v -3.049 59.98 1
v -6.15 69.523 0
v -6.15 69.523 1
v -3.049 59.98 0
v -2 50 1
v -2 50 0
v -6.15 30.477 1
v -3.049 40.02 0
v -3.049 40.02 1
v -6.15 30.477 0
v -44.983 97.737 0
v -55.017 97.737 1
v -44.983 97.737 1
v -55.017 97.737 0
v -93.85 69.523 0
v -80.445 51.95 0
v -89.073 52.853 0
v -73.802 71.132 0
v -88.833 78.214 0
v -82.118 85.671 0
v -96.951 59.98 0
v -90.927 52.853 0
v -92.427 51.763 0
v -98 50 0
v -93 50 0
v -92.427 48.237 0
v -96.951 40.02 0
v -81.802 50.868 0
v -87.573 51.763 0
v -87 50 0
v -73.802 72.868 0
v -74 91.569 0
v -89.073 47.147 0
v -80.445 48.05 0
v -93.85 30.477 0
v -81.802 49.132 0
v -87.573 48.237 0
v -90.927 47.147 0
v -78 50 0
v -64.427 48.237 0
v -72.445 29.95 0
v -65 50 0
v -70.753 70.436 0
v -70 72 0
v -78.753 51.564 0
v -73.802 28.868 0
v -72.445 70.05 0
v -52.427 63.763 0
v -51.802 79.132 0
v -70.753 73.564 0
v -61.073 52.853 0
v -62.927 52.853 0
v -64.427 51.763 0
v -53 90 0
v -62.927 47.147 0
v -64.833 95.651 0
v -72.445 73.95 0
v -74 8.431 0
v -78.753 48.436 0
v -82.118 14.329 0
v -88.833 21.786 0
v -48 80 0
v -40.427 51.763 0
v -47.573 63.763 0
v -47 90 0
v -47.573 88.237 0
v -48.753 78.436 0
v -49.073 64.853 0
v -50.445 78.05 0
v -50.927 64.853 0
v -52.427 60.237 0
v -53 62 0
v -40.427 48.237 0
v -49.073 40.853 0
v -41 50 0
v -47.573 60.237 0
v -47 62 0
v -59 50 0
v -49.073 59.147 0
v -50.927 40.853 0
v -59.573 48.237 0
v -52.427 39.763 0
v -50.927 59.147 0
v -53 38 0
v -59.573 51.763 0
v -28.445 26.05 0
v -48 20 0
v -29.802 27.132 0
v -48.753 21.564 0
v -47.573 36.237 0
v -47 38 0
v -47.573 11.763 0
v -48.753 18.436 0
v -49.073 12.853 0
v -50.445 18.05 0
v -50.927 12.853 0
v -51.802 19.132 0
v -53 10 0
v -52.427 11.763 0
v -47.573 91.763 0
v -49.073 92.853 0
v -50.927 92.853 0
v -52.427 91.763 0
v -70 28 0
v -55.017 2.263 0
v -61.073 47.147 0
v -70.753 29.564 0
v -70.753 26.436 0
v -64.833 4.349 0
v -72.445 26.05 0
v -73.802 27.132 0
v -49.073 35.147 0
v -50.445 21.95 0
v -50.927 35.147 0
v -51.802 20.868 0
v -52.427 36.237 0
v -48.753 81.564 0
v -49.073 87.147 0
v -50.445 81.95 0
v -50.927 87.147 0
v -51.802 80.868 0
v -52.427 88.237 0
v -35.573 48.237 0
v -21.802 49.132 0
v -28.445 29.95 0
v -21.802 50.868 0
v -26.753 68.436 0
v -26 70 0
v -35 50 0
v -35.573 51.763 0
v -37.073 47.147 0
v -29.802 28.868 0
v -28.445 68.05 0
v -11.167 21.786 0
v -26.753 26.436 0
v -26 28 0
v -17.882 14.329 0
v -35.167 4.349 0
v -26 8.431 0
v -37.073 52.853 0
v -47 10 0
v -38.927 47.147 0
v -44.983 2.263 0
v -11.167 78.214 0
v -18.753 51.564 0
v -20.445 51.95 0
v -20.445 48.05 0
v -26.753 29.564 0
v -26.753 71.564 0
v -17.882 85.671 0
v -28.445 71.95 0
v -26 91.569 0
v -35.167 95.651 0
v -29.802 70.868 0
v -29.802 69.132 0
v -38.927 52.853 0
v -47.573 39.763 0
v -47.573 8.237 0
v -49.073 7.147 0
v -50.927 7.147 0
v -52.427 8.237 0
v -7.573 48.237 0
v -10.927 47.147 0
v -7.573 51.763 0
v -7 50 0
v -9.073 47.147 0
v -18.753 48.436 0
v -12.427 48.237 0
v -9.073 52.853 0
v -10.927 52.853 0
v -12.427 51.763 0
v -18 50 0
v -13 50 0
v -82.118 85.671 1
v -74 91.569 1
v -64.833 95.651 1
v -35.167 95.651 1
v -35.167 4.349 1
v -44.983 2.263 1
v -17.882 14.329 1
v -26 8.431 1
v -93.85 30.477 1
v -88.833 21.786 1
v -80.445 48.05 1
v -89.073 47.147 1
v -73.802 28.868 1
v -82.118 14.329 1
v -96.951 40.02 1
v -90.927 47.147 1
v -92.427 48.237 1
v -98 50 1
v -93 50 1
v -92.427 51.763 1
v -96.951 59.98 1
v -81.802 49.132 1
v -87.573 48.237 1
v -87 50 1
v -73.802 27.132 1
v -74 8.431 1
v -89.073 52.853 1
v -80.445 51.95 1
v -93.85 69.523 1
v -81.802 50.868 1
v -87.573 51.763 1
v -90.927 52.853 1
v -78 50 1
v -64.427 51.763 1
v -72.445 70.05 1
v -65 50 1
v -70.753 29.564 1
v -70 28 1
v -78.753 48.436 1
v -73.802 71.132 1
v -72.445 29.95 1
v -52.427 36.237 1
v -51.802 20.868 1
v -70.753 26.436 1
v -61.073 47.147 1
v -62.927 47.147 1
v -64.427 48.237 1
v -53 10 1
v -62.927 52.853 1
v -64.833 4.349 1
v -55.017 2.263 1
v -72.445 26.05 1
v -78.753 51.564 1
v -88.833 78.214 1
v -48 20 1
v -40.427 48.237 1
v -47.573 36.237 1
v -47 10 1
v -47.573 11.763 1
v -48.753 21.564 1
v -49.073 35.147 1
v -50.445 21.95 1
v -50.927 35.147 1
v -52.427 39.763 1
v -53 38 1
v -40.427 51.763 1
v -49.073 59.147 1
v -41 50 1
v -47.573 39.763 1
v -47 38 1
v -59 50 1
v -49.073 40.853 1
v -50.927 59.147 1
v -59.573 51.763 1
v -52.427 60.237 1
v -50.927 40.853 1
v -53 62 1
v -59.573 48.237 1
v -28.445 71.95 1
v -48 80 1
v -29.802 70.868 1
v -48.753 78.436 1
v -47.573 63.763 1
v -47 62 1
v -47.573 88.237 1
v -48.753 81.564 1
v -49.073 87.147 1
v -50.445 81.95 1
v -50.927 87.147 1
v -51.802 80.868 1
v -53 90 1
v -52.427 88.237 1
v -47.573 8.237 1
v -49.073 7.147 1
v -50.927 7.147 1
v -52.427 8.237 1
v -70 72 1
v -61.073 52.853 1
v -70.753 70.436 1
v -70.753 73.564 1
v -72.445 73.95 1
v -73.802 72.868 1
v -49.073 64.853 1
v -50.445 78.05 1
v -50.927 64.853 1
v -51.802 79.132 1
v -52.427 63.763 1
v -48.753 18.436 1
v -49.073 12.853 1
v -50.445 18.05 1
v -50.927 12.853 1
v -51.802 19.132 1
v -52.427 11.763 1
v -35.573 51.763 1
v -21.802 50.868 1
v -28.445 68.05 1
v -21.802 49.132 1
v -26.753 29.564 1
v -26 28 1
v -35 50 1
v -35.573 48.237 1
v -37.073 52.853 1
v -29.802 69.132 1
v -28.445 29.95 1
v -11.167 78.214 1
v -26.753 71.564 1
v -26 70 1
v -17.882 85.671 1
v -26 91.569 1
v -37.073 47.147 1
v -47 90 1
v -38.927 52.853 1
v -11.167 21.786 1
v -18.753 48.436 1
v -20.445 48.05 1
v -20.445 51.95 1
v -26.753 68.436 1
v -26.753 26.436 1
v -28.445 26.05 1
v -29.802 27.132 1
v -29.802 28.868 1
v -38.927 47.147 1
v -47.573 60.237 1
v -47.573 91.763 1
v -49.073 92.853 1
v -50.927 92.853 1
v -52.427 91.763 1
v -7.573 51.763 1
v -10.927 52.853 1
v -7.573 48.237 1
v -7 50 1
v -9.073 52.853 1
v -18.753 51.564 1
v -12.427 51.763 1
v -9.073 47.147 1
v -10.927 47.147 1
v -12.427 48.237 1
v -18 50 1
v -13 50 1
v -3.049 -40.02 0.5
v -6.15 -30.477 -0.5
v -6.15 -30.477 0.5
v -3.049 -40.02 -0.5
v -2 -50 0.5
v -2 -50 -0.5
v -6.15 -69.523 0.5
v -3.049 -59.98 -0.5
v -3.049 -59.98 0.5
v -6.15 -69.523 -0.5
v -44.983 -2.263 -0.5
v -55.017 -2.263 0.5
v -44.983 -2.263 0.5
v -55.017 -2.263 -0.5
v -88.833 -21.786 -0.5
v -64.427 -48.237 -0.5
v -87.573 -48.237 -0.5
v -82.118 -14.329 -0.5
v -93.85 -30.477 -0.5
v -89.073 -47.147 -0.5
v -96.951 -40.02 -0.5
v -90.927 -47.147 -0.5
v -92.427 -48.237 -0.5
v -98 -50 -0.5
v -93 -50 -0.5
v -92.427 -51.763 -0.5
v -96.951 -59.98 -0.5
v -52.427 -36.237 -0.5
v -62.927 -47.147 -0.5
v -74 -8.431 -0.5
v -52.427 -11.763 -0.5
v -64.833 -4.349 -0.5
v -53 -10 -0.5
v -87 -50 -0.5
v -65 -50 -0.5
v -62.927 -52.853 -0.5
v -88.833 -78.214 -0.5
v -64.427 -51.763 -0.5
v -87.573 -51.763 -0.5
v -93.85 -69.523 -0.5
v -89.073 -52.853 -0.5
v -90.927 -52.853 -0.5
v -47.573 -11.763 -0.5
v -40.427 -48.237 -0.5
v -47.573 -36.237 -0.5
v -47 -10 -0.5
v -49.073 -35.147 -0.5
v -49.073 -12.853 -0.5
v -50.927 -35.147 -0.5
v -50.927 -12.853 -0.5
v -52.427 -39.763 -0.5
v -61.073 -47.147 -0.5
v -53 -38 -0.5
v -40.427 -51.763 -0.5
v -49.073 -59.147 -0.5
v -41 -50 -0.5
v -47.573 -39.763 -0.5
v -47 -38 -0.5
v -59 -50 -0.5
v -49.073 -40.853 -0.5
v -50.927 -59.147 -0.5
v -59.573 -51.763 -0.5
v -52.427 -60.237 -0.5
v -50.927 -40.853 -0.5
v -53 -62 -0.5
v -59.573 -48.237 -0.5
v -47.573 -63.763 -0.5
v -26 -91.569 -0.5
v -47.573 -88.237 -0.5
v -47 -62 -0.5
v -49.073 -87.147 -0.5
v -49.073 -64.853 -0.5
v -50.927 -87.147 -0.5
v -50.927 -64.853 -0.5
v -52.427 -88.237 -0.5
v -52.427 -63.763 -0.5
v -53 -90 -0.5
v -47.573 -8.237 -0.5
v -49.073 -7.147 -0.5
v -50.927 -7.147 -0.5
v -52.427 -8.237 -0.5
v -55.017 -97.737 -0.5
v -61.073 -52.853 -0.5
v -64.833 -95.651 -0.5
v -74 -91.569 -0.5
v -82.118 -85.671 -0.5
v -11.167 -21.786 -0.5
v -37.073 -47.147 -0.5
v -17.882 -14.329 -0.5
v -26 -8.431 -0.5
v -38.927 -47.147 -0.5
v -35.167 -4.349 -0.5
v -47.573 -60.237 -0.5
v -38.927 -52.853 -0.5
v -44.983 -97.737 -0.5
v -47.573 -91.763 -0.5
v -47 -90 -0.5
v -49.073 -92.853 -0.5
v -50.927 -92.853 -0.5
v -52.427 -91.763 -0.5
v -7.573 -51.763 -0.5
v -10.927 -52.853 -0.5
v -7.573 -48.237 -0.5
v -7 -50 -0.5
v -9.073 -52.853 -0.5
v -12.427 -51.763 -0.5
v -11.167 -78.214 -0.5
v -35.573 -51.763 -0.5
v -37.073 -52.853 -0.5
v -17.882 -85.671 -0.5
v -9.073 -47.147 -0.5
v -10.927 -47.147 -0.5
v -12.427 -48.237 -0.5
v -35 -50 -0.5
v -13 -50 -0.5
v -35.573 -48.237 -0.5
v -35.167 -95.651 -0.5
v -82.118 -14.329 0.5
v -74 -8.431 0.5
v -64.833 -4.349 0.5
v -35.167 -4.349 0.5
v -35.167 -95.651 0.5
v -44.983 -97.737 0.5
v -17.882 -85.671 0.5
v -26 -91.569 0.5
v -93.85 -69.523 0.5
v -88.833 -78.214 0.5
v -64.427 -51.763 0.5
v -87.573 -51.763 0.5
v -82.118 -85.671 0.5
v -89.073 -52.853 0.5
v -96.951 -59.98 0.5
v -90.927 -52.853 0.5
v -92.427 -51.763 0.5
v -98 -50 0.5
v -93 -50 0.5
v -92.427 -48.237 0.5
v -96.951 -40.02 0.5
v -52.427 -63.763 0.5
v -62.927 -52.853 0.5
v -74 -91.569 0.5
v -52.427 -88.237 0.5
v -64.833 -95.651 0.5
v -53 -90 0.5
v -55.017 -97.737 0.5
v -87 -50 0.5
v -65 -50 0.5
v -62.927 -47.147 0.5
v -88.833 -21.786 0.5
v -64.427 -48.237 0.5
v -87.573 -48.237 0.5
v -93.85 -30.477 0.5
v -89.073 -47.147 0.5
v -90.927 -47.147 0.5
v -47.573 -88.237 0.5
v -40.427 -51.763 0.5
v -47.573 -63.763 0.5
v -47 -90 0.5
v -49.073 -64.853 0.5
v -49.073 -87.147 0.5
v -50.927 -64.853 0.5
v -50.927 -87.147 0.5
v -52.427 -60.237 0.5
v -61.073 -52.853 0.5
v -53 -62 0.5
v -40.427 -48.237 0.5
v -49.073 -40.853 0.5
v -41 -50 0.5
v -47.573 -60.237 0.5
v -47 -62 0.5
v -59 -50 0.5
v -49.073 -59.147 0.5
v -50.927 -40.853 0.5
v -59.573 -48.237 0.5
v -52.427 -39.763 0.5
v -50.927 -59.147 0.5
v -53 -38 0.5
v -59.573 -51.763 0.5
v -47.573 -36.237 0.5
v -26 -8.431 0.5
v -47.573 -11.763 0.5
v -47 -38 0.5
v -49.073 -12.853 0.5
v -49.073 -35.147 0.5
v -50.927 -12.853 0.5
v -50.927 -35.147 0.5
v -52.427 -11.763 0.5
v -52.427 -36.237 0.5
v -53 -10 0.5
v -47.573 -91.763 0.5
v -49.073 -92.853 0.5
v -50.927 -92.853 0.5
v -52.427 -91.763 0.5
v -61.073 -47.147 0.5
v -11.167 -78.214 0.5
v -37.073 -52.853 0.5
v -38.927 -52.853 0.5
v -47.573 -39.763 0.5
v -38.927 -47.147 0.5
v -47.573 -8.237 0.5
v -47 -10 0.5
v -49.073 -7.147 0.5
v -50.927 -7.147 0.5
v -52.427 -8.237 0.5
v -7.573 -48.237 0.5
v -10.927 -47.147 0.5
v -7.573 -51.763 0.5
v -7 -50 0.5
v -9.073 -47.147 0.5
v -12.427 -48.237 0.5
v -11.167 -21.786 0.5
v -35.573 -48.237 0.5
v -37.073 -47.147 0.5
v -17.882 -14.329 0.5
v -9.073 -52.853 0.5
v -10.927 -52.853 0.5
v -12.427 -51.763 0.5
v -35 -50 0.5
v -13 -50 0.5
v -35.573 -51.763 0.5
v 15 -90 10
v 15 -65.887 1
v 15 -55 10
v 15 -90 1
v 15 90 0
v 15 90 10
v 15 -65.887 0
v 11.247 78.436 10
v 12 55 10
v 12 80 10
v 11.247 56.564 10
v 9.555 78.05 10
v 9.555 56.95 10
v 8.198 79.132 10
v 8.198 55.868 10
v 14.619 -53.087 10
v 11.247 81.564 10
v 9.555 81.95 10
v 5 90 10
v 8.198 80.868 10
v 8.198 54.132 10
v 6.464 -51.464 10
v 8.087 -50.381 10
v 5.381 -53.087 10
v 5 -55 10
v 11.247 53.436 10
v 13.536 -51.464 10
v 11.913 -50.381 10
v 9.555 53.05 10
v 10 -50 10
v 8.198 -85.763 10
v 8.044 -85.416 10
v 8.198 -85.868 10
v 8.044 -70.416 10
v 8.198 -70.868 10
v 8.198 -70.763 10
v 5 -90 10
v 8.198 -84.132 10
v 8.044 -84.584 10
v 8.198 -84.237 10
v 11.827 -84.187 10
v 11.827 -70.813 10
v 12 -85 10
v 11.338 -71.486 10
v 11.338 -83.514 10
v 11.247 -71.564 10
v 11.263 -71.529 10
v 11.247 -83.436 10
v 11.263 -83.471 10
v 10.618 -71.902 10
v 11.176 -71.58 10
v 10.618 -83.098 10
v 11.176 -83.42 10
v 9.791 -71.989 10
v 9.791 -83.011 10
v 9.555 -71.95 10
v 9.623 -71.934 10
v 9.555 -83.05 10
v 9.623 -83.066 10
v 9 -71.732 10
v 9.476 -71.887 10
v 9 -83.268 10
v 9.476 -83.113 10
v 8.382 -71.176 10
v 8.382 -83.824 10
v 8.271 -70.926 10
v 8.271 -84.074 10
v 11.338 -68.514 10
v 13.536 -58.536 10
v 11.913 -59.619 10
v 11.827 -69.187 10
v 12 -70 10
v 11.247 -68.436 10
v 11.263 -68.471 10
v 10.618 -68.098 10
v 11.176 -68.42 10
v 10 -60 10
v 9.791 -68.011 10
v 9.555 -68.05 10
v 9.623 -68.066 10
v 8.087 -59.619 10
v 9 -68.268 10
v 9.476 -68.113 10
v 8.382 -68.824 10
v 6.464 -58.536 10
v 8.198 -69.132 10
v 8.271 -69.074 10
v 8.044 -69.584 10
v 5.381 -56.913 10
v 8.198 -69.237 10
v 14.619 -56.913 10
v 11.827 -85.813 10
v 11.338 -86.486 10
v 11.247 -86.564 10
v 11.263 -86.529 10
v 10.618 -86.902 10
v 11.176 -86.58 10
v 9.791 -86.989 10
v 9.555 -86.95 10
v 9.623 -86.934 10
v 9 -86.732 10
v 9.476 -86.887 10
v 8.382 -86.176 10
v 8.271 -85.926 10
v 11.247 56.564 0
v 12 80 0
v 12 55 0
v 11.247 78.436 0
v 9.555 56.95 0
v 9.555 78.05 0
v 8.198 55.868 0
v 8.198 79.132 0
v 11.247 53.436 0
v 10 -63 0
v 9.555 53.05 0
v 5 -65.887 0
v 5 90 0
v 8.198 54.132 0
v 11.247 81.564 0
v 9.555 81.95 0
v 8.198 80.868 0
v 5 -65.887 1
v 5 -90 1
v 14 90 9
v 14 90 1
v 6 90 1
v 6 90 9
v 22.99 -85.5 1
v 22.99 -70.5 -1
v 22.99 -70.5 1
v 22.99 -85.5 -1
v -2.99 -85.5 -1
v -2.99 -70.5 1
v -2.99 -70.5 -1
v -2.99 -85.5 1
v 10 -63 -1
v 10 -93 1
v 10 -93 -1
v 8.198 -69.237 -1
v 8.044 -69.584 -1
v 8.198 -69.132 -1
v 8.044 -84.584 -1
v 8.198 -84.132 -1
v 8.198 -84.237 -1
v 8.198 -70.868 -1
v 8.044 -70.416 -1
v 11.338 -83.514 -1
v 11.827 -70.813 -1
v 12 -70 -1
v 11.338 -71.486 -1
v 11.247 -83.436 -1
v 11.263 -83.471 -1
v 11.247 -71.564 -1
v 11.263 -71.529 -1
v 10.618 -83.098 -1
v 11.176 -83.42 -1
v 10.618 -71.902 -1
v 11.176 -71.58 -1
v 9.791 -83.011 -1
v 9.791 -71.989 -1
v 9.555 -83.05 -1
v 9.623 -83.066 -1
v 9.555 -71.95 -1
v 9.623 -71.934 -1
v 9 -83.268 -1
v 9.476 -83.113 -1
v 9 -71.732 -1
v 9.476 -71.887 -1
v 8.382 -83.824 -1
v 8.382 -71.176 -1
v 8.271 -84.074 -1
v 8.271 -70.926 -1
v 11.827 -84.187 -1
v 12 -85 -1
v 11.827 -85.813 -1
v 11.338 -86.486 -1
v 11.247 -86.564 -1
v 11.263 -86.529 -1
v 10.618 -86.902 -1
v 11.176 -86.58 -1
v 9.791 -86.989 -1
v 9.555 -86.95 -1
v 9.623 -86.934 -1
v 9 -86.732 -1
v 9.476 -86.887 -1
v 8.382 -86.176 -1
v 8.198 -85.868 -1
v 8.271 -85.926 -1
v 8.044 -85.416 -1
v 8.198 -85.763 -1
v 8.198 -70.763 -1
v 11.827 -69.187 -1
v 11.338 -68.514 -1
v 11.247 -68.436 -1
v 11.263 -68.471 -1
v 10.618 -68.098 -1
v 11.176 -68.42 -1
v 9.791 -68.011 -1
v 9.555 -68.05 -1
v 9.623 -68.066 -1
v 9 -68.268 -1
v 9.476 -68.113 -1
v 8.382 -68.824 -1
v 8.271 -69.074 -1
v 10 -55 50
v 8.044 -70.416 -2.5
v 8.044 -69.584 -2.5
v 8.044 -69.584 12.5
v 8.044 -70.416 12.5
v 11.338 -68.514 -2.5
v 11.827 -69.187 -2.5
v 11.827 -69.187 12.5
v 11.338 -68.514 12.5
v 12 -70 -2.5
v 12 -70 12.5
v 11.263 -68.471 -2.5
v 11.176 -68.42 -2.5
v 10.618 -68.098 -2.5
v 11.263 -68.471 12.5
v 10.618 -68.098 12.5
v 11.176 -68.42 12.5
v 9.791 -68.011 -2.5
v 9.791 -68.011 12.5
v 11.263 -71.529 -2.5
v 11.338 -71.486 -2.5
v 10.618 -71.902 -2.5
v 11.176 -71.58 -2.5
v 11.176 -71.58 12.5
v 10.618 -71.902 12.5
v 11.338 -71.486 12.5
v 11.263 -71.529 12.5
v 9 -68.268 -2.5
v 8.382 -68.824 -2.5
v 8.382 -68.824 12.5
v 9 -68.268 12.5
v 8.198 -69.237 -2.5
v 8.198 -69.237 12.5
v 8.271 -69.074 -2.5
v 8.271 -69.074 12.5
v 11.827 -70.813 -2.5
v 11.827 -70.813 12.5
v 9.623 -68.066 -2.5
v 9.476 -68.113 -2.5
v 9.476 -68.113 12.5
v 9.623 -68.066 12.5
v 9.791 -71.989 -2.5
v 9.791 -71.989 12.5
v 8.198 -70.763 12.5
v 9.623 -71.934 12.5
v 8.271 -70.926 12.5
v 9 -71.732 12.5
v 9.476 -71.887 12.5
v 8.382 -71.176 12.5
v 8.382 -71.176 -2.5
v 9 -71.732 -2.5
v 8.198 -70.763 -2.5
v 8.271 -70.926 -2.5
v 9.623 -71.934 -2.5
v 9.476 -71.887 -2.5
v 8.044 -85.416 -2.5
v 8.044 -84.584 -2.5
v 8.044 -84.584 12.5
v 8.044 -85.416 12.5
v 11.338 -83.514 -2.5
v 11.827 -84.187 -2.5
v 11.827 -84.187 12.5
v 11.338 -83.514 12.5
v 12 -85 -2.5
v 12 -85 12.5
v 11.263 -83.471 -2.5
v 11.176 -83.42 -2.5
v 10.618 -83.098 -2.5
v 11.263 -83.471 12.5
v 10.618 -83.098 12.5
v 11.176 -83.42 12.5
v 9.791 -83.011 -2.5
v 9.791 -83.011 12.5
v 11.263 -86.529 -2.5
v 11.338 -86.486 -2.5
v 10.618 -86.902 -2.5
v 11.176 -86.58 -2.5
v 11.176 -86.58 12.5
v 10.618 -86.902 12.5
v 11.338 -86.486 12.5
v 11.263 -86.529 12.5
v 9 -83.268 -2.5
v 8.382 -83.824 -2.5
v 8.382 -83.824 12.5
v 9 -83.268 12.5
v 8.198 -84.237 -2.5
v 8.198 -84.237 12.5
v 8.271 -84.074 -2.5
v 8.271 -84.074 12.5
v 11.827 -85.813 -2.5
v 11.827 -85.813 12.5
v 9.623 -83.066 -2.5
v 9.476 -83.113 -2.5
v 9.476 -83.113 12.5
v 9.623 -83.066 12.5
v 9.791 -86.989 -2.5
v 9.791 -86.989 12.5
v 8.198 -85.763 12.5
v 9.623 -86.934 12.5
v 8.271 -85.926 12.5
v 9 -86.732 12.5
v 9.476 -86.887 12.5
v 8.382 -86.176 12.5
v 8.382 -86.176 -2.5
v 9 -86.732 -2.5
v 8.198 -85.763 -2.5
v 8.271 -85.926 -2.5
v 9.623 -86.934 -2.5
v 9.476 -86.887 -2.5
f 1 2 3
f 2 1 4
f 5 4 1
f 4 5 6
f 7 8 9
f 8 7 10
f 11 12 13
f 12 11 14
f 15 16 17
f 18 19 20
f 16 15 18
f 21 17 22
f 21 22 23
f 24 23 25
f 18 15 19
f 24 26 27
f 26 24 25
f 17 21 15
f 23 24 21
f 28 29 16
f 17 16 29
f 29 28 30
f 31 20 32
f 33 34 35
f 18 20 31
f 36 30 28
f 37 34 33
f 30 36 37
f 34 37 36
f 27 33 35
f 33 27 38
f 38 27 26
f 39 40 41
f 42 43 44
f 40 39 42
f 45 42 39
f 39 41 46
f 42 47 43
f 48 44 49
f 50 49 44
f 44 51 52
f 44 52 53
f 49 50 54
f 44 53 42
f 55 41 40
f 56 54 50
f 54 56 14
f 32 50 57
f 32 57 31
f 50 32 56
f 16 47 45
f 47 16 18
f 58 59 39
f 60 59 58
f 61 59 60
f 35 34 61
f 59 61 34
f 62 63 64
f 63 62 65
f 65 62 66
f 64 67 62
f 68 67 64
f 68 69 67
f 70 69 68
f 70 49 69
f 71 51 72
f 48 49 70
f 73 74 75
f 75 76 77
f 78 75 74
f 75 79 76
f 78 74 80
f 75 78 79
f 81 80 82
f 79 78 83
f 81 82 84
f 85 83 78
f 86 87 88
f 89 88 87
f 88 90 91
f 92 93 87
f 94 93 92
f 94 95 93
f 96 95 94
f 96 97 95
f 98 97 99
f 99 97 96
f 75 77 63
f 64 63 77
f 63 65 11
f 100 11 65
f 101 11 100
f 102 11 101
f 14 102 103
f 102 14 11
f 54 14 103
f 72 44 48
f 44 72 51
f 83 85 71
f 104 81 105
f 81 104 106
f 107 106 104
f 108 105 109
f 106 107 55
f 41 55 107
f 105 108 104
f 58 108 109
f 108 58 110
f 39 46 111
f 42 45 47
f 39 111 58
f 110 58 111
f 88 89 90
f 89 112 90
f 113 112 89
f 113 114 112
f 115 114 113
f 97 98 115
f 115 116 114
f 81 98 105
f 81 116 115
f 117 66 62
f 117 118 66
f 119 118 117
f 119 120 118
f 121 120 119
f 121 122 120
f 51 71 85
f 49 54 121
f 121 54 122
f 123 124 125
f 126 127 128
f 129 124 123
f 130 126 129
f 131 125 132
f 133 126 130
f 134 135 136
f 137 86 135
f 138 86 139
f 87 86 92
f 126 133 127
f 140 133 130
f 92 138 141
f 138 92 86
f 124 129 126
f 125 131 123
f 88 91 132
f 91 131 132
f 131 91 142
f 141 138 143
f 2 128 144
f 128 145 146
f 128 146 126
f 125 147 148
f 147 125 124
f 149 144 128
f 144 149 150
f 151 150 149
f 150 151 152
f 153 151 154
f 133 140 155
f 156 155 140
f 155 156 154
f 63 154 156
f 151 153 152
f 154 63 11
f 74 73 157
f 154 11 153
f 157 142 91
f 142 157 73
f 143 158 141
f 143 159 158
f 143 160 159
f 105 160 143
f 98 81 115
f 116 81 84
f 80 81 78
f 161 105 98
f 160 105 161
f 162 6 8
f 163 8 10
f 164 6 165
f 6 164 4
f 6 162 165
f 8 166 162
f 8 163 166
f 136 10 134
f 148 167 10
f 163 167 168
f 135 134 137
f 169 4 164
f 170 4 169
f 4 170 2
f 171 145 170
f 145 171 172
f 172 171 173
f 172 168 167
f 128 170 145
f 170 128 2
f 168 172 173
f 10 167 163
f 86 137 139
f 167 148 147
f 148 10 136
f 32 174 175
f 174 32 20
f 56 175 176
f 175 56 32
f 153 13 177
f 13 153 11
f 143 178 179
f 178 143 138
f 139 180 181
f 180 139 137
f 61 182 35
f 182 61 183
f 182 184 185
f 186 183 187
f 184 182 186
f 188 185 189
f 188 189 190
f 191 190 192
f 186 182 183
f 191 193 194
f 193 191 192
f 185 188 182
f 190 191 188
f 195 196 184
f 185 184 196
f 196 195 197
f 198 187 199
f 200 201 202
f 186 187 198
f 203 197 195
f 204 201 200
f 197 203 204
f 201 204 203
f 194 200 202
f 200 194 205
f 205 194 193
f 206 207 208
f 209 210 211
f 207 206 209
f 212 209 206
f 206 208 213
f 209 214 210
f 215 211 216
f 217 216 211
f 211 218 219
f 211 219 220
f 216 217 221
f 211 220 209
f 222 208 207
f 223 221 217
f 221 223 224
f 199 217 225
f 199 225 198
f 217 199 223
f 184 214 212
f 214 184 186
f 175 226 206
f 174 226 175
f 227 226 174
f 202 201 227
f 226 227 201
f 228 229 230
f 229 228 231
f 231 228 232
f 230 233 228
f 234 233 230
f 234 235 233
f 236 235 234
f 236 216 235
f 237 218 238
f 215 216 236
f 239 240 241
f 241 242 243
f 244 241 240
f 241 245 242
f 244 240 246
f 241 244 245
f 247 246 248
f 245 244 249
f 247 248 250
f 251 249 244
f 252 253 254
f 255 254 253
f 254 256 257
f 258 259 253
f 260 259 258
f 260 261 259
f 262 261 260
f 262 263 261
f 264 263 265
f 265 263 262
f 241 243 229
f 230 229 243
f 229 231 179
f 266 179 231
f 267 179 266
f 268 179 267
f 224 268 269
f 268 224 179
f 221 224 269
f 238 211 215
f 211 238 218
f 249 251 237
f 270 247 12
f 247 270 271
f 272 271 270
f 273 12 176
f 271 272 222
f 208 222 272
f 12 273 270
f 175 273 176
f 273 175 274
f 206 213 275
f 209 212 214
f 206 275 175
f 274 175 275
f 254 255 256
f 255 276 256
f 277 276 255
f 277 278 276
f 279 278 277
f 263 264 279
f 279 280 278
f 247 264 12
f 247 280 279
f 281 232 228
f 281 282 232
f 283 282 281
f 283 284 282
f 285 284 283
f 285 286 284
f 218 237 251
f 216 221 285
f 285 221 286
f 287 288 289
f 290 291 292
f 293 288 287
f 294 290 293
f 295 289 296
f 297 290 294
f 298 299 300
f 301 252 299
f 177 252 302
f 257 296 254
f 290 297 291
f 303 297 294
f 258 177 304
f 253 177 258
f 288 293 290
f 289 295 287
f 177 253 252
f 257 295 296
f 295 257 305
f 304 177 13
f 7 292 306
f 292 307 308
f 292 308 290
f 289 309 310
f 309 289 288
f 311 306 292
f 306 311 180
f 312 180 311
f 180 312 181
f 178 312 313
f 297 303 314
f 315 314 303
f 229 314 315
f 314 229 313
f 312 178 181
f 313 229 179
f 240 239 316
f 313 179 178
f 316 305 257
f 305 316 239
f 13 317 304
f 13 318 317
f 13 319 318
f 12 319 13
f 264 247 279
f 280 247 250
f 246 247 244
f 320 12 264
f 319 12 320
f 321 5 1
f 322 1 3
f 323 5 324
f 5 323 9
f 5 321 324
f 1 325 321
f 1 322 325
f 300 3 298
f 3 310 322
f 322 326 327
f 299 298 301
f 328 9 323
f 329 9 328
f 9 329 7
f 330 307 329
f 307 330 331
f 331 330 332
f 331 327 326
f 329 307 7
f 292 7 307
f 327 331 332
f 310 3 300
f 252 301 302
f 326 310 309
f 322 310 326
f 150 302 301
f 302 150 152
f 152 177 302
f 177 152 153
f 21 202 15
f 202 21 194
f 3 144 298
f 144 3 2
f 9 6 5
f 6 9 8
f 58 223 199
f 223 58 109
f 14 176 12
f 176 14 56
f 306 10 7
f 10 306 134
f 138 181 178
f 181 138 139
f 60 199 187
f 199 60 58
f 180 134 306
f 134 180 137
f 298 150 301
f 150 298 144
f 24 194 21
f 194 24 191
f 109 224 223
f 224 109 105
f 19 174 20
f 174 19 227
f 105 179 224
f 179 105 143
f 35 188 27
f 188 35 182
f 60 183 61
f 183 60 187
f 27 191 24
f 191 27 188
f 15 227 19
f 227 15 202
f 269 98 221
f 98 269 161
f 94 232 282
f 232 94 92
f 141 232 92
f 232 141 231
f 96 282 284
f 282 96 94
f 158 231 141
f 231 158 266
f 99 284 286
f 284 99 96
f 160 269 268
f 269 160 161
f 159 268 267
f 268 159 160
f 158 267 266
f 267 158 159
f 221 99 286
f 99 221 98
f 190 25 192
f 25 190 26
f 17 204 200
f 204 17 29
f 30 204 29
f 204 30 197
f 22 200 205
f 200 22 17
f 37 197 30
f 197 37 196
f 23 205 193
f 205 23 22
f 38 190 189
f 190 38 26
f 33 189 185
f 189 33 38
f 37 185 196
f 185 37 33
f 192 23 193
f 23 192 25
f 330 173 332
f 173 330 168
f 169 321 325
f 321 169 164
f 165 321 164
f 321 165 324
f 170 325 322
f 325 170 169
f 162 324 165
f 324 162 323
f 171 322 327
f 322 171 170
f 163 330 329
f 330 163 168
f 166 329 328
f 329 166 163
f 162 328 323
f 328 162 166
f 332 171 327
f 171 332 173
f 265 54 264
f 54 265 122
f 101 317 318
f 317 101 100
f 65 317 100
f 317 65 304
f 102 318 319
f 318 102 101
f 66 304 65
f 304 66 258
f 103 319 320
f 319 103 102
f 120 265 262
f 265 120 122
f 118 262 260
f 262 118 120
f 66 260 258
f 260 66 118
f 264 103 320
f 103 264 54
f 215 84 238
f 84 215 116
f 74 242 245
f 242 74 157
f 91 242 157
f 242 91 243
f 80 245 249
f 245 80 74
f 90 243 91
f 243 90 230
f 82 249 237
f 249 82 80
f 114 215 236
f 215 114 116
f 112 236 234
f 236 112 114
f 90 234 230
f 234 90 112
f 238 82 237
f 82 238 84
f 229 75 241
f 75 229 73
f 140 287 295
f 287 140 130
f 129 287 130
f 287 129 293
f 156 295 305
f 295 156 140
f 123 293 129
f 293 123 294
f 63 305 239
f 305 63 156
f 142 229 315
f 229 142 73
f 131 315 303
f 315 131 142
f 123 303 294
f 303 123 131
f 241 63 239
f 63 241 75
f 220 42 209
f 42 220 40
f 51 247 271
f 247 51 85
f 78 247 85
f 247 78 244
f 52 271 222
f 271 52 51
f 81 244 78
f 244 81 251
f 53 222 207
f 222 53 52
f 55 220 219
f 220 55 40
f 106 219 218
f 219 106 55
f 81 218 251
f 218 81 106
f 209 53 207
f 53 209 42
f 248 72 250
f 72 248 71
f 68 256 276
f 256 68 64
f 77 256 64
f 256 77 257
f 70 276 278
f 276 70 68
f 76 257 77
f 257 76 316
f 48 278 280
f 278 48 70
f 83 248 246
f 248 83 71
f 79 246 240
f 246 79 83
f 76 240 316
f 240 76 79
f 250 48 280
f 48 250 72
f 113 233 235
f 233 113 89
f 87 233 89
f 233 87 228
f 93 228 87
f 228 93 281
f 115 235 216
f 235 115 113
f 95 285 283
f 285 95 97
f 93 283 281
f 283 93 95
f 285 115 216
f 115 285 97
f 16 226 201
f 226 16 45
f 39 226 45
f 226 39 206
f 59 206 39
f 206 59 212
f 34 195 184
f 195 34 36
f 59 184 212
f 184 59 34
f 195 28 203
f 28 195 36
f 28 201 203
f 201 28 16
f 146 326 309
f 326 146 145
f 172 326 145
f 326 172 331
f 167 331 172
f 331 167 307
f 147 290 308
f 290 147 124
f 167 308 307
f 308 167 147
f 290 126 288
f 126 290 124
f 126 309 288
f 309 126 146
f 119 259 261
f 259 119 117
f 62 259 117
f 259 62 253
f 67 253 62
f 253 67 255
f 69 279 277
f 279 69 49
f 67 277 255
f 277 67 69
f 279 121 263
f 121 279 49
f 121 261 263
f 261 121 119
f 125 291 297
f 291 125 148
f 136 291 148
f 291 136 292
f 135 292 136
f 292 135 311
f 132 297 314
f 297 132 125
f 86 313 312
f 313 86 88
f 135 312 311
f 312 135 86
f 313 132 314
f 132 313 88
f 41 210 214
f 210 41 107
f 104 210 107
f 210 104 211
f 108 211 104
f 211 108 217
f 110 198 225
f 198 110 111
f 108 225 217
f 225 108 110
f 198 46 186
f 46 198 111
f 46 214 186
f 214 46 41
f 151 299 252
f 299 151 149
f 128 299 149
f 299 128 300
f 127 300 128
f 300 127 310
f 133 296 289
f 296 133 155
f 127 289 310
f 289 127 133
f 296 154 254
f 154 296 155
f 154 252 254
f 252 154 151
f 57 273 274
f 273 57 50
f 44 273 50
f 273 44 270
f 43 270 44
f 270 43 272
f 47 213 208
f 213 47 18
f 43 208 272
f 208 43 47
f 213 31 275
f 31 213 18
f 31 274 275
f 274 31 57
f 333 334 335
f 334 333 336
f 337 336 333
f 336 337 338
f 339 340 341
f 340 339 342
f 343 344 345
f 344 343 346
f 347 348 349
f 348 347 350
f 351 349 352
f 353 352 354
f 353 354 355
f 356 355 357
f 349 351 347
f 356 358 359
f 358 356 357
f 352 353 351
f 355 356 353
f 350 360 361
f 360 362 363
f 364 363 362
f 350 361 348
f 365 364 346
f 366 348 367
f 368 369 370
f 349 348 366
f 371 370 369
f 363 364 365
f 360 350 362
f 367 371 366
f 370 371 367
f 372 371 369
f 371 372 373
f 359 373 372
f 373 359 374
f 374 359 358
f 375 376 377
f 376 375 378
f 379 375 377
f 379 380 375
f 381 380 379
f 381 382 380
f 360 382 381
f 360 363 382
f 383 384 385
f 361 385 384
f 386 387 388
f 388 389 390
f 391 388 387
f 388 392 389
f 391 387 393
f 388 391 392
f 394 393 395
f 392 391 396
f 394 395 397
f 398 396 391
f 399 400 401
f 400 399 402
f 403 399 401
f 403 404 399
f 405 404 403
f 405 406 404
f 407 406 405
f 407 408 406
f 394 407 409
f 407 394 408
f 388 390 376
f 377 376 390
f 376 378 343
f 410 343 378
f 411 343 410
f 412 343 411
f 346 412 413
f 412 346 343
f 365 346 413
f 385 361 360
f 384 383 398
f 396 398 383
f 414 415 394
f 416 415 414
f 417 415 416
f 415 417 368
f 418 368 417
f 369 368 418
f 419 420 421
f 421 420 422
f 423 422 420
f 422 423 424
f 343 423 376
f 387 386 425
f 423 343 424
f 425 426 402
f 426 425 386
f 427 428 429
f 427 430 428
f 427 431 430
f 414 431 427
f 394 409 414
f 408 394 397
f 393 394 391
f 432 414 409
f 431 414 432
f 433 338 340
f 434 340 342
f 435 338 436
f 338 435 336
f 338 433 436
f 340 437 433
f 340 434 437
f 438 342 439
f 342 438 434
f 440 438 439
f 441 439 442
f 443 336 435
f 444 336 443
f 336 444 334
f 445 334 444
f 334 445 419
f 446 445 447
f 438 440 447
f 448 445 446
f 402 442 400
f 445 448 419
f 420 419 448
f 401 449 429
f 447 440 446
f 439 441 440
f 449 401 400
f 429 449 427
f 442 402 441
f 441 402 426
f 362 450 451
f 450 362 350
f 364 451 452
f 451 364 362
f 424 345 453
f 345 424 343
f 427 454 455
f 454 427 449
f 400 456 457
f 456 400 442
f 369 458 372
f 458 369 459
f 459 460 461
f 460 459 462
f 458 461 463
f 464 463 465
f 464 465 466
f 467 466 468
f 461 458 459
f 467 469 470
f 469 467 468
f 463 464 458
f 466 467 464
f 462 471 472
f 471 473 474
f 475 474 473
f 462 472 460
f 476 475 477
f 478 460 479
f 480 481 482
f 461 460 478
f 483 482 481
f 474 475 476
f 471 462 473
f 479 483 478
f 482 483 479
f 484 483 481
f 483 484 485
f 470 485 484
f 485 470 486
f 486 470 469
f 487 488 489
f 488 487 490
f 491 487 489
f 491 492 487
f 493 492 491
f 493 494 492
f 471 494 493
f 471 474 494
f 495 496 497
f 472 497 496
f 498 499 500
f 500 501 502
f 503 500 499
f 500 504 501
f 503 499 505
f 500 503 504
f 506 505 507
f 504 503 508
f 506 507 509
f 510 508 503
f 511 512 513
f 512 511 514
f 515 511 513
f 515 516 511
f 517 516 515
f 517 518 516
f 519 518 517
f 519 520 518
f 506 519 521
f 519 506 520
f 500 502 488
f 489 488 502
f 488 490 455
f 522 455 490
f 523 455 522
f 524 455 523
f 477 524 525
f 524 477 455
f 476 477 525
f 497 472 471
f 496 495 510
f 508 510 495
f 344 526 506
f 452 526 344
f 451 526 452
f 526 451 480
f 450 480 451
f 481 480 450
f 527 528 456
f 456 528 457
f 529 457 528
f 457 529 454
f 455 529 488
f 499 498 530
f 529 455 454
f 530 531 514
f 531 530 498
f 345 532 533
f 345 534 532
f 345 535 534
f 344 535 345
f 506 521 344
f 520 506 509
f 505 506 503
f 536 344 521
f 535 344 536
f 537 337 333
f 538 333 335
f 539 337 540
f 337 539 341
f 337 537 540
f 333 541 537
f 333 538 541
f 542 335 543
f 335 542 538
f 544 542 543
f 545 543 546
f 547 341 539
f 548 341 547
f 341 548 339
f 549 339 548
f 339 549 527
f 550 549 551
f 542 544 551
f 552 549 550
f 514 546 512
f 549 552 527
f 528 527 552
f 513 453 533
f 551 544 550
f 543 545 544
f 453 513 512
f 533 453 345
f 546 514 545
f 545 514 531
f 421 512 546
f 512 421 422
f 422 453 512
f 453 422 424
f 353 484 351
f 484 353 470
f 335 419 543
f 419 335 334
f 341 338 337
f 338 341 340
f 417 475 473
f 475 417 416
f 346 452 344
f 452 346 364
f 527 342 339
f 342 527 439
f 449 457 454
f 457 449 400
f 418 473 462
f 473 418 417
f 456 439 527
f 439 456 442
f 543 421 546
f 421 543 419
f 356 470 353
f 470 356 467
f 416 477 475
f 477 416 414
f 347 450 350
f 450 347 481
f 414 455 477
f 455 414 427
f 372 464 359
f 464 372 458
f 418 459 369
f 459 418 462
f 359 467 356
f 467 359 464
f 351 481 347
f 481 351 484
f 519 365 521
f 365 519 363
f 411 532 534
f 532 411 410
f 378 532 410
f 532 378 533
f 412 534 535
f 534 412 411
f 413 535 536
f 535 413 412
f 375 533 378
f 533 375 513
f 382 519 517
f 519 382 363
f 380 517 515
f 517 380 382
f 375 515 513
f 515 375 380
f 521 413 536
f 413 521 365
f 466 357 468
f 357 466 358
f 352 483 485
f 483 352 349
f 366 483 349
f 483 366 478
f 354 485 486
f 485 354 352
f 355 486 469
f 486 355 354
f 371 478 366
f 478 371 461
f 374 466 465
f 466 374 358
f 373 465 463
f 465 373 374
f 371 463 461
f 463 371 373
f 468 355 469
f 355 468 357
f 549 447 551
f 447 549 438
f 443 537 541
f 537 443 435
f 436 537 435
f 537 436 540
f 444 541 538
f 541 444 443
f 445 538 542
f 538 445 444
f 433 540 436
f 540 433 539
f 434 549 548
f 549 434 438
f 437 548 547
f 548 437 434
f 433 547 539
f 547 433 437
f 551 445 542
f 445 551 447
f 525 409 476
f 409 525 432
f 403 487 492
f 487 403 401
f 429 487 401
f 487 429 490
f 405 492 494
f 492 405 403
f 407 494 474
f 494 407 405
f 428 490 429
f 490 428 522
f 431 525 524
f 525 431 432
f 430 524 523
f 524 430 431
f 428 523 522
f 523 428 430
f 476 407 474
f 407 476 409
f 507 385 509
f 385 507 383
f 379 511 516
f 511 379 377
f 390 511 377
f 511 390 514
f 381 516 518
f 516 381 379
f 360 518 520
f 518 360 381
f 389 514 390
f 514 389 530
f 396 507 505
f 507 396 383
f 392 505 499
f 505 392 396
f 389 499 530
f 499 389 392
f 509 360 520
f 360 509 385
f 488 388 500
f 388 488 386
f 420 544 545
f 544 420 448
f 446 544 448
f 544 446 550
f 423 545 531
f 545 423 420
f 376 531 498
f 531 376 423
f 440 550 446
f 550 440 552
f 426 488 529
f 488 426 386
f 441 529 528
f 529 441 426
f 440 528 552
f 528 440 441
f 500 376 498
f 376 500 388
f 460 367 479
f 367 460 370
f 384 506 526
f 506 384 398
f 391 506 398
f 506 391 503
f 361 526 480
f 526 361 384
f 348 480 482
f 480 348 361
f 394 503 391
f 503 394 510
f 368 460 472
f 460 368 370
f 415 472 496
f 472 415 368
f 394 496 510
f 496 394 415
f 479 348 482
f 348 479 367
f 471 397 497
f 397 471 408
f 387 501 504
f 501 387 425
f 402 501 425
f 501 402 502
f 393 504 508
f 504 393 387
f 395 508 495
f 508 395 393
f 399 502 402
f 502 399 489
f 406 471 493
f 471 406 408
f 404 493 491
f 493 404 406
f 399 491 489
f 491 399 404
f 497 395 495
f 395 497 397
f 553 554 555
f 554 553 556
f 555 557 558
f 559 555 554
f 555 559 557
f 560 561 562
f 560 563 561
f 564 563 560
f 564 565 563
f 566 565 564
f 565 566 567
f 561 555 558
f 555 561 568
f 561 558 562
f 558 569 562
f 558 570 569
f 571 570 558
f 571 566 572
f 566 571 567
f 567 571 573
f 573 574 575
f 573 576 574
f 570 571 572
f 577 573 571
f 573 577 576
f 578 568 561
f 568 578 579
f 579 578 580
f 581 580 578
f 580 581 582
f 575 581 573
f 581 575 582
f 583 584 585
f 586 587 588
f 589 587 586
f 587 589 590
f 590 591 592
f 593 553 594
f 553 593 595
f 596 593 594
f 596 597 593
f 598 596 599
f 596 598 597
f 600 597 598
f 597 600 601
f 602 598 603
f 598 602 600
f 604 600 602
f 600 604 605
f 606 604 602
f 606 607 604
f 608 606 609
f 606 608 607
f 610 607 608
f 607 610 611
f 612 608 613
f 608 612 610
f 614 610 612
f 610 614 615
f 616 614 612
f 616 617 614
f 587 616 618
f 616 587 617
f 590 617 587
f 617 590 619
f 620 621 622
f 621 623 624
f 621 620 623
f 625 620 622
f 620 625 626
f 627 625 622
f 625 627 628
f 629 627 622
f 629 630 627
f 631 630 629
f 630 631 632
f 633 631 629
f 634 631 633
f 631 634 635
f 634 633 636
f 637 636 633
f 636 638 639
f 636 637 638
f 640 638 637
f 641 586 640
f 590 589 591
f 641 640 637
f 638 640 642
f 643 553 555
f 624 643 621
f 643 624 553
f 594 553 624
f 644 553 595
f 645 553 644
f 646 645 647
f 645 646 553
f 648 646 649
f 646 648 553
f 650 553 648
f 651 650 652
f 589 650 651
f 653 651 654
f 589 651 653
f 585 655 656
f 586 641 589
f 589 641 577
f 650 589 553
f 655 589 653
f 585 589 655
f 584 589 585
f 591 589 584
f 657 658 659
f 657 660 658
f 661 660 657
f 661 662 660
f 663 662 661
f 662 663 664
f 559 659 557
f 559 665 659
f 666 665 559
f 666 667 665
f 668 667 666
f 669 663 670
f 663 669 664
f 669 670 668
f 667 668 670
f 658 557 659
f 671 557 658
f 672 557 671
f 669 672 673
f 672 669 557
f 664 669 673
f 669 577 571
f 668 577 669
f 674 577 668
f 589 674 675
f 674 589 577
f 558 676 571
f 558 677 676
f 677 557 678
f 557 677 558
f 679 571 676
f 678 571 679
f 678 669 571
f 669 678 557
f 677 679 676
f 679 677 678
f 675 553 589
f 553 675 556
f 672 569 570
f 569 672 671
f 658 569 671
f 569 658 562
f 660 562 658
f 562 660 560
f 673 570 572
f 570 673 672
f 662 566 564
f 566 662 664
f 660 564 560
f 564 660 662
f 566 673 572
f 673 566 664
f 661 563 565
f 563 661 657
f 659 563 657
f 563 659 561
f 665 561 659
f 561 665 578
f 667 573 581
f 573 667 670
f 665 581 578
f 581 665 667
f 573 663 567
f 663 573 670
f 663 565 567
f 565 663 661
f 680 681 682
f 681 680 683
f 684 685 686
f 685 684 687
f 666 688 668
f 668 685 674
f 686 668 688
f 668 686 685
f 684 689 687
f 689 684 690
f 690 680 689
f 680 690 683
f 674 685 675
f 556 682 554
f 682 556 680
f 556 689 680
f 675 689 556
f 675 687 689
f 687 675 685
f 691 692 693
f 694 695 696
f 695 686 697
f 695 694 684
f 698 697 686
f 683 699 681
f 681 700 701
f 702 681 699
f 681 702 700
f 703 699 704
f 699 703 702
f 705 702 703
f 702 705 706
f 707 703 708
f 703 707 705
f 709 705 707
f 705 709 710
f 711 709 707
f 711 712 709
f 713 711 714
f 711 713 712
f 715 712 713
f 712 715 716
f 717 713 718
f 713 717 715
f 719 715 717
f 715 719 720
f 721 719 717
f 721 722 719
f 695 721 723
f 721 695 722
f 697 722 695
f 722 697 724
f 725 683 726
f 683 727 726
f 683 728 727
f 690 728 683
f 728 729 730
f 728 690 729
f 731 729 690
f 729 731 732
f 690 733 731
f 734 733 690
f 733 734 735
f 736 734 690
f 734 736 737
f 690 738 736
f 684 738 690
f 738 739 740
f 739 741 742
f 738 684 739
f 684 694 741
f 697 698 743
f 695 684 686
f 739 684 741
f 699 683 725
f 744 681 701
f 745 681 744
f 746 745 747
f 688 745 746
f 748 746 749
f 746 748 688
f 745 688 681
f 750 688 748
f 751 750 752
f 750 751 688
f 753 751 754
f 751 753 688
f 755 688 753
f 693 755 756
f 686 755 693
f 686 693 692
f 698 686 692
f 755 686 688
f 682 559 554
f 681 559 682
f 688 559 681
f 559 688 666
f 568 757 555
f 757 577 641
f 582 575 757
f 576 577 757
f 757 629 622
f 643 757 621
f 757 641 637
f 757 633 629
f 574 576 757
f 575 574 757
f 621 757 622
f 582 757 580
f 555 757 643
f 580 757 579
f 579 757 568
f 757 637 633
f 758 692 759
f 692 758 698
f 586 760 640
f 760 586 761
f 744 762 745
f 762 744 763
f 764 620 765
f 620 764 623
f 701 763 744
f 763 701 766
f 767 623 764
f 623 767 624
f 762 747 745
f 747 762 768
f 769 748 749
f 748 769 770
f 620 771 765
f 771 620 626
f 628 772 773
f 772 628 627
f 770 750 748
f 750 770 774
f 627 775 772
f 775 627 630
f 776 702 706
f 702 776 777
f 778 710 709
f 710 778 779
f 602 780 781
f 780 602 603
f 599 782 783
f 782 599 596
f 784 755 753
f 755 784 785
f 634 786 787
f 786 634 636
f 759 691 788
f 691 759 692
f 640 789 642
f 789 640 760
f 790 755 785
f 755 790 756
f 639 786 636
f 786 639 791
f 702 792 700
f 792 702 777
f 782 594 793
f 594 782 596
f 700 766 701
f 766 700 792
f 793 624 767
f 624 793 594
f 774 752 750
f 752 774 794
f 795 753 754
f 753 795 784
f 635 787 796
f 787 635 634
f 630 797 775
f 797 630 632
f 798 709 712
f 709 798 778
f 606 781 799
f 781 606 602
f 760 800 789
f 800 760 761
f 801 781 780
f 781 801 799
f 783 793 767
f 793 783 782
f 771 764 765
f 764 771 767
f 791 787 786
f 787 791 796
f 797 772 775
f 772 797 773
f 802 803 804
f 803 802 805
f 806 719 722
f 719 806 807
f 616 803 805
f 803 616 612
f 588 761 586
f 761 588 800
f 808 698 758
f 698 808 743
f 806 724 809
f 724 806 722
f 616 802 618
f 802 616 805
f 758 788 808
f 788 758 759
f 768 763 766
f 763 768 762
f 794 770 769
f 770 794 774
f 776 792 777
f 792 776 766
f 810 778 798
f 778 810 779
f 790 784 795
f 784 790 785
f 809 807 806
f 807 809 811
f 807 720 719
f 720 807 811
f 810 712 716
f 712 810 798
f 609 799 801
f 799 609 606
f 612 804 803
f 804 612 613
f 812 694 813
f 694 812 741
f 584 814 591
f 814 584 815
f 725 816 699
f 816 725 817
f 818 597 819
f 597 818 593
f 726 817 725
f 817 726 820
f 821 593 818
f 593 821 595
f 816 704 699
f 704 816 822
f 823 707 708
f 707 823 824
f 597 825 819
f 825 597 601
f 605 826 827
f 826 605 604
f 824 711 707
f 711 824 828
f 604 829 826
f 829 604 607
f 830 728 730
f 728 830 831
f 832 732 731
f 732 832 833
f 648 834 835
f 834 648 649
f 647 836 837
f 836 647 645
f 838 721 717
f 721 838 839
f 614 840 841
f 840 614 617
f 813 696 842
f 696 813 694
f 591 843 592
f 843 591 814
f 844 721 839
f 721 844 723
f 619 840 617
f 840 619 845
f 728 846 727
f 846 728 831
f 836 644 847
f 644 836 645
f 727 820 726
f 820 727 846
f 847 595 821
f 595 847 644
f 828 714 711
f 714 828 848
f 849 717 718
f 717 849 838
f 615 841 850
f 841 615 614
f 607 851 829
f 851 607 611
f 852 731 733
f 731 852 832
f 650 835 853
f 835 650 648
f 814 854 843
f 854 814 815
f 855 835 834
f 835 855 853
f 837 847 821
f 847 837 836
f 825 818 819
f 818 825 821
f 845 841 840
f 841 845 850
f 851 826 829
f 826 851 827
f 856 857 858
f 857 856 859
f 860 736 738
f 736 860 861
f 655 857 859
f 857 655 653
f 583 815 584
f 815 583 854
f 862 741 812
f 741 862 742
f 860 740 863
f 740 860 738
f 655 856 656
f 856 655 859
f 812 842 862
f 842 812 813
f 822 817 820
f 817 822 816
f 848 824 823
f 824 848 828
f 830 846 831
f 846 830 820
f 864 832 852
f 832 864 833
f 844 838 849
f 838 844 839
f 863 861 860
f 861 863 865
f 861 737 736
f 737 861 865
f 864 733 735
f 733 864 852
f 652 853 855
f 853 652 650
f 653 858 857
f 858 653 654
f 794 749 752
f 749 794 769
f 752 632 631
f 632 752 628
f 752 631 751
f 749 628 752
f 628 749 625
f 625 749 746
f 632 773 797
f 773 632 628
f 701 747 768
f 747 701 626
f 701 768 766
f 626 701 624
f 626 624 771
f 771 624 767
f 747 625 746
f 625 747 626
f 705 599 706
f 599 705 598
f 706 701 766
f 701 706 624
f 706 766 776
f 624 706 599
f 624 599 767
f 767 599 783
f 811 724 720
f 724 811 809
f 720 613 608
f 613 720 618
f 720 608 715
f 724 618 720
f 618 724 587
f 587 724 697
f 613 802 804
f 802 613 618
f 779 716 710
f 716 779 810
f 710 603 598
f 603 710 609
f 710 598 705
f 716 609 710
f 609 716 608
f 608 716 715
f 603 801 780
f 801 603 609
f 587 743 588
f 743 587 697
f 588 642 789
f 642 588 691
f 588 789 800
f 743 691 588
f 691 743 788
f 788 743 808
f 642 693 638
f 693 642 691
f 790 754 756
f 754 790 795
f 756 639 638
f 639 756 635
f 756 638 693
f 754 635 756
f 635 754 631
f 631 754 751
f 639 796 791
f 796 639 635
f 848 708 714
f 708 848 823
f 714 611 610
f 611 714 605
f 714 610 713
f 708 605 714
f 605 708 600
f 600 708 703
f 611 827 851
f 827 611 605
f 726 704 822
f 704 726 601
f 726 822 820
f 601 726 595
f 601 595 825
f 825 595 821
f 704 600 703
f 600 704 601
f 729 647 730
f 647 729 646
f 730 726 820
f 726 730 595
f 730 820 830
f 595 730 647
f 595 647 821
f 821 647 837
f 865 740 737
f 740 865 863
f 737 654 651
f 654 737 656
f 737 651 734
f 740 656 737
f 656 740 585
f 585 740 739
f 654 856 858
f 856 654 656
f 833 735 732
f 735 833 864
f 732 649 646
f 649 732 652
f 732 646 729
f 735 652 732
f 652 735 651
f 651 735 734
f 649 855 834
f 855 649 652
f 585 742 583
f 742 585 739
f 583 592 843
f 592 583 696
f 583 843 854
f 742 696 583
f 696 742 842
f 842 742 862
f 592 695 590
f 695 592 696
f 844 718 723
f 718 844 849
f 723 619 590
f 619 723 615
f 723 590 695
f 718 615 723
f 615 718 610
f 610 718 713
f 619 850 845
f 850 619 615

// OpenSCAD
radioCilindro = 48;
radioCilindrosAgujero= 3;
dimBarra = [10,180,10];
dimVacioBarra = [8,170,8];
module cilindroUno(){
    translate([-50,-50,0])
        cylinder(h=1, r=radioCilindro, center= true);
}
module parteBaja(){
    difference(){
          cilindroDos();
            cilindrosGrandesAgujero(-50,10,0);
            cilindrosGrandesAgujero(-90,50,0);
            cilindrosGrandesAgujero(-10, 50,0);
            cilindrosGrandesAgujero(-50, 90,0);
            cilindrosGrandesAgujero(-50, 38,0);
            cilindrosGrandesAgujero(-38,50,0);
            cilindrosGrandesAgujero(-62, 50,0);
            cilindrosGrandesAgujero(-50, 62,0);
            //Pequeños
            cilindrosPequeAgujero(-50,20,0);
            cilindrosPequeAgujero(-80,50,0);
            cilindrosPequeAgujero(-20,50,0);
            cilindrosPequeAgujero(-50,80,0);
            
            cilindrosPequeAgujero(-28,28,0);
            cilindrosPequeAgujero(-72,28,0);
            cilindrosPequeAgujero(-28,70,0);
            cilindrosPequeAgujero(-72,72,0);
        }
}
module tornillo(){
    cylinder(h=15, d = 4, center = true, $fn=15);
}

parteBaja();
parteMedia();
helice();
module parteMedia(){
    difference(){
        cilindroUno();
        cilindrosGrandesAgujero(-50,-10,0);
        cilindrosGrandesAgujero(-90,-50,0);
        cilindrosGrandesAgujero(-10,-50,0);
        cilindrosGrandesAgujero(-50,-90,0);
        cilindrosGrandesAgujero(-50,-38,0);
        cilindrosGrandesAgujero(-38,-50,0);
        cilindrosGrandesAgujero(-62,-50,0);
        cilindrosGrandesAgujero(-50,-62,0);
    }
}
module cilindroDos(){
        translate([-50,50,0]){
            cylinder(r=radioCilindro);
        }
}
module cilindrosGrandesAgujero(x,y,z){
    translate([x,y,z]){
        cylinder(r=radioCilindrosAgujero,h = 50, center=true);
    }
}

module cilindrosPequeAgujero(x,y,z){
    translate([x,y,z]){
        cylinder(r=2,h = 80, center=true);
    }
}

module barras(){
    difference(){
        translate([5,-90,0])
        cube(dimBarra);
        translate([6,90,1])
        cube(dimVacioBarra);
        translate([10,80,0])
        cilindrosPequeAgujero(); 
        translate([10,55,0])
        cilindrosPequeAgujero(); 
    }
}
module hexagono(){
    translate([10,-78,0])
    rotate([0,0,90])
    cylinder(r=15,h = 2, center=true, $fn=6);
}
module helice(){
    difference(){
        union(){
            union(){
                barras();
                hexagono();
            }
            translate([10,-55,10])
            cylinder(r1=5,r=0,h=40);
            //Tornillos
            translate([10,-70,5])
            tornillo();
            translate([10,-85,5])
            tornillo();
        }
        translate([10,-70,0])
        cilindrosPequeAgujero();
        translate([10,-85,0])
        cilindrosPequeAgujero();
    }
}
